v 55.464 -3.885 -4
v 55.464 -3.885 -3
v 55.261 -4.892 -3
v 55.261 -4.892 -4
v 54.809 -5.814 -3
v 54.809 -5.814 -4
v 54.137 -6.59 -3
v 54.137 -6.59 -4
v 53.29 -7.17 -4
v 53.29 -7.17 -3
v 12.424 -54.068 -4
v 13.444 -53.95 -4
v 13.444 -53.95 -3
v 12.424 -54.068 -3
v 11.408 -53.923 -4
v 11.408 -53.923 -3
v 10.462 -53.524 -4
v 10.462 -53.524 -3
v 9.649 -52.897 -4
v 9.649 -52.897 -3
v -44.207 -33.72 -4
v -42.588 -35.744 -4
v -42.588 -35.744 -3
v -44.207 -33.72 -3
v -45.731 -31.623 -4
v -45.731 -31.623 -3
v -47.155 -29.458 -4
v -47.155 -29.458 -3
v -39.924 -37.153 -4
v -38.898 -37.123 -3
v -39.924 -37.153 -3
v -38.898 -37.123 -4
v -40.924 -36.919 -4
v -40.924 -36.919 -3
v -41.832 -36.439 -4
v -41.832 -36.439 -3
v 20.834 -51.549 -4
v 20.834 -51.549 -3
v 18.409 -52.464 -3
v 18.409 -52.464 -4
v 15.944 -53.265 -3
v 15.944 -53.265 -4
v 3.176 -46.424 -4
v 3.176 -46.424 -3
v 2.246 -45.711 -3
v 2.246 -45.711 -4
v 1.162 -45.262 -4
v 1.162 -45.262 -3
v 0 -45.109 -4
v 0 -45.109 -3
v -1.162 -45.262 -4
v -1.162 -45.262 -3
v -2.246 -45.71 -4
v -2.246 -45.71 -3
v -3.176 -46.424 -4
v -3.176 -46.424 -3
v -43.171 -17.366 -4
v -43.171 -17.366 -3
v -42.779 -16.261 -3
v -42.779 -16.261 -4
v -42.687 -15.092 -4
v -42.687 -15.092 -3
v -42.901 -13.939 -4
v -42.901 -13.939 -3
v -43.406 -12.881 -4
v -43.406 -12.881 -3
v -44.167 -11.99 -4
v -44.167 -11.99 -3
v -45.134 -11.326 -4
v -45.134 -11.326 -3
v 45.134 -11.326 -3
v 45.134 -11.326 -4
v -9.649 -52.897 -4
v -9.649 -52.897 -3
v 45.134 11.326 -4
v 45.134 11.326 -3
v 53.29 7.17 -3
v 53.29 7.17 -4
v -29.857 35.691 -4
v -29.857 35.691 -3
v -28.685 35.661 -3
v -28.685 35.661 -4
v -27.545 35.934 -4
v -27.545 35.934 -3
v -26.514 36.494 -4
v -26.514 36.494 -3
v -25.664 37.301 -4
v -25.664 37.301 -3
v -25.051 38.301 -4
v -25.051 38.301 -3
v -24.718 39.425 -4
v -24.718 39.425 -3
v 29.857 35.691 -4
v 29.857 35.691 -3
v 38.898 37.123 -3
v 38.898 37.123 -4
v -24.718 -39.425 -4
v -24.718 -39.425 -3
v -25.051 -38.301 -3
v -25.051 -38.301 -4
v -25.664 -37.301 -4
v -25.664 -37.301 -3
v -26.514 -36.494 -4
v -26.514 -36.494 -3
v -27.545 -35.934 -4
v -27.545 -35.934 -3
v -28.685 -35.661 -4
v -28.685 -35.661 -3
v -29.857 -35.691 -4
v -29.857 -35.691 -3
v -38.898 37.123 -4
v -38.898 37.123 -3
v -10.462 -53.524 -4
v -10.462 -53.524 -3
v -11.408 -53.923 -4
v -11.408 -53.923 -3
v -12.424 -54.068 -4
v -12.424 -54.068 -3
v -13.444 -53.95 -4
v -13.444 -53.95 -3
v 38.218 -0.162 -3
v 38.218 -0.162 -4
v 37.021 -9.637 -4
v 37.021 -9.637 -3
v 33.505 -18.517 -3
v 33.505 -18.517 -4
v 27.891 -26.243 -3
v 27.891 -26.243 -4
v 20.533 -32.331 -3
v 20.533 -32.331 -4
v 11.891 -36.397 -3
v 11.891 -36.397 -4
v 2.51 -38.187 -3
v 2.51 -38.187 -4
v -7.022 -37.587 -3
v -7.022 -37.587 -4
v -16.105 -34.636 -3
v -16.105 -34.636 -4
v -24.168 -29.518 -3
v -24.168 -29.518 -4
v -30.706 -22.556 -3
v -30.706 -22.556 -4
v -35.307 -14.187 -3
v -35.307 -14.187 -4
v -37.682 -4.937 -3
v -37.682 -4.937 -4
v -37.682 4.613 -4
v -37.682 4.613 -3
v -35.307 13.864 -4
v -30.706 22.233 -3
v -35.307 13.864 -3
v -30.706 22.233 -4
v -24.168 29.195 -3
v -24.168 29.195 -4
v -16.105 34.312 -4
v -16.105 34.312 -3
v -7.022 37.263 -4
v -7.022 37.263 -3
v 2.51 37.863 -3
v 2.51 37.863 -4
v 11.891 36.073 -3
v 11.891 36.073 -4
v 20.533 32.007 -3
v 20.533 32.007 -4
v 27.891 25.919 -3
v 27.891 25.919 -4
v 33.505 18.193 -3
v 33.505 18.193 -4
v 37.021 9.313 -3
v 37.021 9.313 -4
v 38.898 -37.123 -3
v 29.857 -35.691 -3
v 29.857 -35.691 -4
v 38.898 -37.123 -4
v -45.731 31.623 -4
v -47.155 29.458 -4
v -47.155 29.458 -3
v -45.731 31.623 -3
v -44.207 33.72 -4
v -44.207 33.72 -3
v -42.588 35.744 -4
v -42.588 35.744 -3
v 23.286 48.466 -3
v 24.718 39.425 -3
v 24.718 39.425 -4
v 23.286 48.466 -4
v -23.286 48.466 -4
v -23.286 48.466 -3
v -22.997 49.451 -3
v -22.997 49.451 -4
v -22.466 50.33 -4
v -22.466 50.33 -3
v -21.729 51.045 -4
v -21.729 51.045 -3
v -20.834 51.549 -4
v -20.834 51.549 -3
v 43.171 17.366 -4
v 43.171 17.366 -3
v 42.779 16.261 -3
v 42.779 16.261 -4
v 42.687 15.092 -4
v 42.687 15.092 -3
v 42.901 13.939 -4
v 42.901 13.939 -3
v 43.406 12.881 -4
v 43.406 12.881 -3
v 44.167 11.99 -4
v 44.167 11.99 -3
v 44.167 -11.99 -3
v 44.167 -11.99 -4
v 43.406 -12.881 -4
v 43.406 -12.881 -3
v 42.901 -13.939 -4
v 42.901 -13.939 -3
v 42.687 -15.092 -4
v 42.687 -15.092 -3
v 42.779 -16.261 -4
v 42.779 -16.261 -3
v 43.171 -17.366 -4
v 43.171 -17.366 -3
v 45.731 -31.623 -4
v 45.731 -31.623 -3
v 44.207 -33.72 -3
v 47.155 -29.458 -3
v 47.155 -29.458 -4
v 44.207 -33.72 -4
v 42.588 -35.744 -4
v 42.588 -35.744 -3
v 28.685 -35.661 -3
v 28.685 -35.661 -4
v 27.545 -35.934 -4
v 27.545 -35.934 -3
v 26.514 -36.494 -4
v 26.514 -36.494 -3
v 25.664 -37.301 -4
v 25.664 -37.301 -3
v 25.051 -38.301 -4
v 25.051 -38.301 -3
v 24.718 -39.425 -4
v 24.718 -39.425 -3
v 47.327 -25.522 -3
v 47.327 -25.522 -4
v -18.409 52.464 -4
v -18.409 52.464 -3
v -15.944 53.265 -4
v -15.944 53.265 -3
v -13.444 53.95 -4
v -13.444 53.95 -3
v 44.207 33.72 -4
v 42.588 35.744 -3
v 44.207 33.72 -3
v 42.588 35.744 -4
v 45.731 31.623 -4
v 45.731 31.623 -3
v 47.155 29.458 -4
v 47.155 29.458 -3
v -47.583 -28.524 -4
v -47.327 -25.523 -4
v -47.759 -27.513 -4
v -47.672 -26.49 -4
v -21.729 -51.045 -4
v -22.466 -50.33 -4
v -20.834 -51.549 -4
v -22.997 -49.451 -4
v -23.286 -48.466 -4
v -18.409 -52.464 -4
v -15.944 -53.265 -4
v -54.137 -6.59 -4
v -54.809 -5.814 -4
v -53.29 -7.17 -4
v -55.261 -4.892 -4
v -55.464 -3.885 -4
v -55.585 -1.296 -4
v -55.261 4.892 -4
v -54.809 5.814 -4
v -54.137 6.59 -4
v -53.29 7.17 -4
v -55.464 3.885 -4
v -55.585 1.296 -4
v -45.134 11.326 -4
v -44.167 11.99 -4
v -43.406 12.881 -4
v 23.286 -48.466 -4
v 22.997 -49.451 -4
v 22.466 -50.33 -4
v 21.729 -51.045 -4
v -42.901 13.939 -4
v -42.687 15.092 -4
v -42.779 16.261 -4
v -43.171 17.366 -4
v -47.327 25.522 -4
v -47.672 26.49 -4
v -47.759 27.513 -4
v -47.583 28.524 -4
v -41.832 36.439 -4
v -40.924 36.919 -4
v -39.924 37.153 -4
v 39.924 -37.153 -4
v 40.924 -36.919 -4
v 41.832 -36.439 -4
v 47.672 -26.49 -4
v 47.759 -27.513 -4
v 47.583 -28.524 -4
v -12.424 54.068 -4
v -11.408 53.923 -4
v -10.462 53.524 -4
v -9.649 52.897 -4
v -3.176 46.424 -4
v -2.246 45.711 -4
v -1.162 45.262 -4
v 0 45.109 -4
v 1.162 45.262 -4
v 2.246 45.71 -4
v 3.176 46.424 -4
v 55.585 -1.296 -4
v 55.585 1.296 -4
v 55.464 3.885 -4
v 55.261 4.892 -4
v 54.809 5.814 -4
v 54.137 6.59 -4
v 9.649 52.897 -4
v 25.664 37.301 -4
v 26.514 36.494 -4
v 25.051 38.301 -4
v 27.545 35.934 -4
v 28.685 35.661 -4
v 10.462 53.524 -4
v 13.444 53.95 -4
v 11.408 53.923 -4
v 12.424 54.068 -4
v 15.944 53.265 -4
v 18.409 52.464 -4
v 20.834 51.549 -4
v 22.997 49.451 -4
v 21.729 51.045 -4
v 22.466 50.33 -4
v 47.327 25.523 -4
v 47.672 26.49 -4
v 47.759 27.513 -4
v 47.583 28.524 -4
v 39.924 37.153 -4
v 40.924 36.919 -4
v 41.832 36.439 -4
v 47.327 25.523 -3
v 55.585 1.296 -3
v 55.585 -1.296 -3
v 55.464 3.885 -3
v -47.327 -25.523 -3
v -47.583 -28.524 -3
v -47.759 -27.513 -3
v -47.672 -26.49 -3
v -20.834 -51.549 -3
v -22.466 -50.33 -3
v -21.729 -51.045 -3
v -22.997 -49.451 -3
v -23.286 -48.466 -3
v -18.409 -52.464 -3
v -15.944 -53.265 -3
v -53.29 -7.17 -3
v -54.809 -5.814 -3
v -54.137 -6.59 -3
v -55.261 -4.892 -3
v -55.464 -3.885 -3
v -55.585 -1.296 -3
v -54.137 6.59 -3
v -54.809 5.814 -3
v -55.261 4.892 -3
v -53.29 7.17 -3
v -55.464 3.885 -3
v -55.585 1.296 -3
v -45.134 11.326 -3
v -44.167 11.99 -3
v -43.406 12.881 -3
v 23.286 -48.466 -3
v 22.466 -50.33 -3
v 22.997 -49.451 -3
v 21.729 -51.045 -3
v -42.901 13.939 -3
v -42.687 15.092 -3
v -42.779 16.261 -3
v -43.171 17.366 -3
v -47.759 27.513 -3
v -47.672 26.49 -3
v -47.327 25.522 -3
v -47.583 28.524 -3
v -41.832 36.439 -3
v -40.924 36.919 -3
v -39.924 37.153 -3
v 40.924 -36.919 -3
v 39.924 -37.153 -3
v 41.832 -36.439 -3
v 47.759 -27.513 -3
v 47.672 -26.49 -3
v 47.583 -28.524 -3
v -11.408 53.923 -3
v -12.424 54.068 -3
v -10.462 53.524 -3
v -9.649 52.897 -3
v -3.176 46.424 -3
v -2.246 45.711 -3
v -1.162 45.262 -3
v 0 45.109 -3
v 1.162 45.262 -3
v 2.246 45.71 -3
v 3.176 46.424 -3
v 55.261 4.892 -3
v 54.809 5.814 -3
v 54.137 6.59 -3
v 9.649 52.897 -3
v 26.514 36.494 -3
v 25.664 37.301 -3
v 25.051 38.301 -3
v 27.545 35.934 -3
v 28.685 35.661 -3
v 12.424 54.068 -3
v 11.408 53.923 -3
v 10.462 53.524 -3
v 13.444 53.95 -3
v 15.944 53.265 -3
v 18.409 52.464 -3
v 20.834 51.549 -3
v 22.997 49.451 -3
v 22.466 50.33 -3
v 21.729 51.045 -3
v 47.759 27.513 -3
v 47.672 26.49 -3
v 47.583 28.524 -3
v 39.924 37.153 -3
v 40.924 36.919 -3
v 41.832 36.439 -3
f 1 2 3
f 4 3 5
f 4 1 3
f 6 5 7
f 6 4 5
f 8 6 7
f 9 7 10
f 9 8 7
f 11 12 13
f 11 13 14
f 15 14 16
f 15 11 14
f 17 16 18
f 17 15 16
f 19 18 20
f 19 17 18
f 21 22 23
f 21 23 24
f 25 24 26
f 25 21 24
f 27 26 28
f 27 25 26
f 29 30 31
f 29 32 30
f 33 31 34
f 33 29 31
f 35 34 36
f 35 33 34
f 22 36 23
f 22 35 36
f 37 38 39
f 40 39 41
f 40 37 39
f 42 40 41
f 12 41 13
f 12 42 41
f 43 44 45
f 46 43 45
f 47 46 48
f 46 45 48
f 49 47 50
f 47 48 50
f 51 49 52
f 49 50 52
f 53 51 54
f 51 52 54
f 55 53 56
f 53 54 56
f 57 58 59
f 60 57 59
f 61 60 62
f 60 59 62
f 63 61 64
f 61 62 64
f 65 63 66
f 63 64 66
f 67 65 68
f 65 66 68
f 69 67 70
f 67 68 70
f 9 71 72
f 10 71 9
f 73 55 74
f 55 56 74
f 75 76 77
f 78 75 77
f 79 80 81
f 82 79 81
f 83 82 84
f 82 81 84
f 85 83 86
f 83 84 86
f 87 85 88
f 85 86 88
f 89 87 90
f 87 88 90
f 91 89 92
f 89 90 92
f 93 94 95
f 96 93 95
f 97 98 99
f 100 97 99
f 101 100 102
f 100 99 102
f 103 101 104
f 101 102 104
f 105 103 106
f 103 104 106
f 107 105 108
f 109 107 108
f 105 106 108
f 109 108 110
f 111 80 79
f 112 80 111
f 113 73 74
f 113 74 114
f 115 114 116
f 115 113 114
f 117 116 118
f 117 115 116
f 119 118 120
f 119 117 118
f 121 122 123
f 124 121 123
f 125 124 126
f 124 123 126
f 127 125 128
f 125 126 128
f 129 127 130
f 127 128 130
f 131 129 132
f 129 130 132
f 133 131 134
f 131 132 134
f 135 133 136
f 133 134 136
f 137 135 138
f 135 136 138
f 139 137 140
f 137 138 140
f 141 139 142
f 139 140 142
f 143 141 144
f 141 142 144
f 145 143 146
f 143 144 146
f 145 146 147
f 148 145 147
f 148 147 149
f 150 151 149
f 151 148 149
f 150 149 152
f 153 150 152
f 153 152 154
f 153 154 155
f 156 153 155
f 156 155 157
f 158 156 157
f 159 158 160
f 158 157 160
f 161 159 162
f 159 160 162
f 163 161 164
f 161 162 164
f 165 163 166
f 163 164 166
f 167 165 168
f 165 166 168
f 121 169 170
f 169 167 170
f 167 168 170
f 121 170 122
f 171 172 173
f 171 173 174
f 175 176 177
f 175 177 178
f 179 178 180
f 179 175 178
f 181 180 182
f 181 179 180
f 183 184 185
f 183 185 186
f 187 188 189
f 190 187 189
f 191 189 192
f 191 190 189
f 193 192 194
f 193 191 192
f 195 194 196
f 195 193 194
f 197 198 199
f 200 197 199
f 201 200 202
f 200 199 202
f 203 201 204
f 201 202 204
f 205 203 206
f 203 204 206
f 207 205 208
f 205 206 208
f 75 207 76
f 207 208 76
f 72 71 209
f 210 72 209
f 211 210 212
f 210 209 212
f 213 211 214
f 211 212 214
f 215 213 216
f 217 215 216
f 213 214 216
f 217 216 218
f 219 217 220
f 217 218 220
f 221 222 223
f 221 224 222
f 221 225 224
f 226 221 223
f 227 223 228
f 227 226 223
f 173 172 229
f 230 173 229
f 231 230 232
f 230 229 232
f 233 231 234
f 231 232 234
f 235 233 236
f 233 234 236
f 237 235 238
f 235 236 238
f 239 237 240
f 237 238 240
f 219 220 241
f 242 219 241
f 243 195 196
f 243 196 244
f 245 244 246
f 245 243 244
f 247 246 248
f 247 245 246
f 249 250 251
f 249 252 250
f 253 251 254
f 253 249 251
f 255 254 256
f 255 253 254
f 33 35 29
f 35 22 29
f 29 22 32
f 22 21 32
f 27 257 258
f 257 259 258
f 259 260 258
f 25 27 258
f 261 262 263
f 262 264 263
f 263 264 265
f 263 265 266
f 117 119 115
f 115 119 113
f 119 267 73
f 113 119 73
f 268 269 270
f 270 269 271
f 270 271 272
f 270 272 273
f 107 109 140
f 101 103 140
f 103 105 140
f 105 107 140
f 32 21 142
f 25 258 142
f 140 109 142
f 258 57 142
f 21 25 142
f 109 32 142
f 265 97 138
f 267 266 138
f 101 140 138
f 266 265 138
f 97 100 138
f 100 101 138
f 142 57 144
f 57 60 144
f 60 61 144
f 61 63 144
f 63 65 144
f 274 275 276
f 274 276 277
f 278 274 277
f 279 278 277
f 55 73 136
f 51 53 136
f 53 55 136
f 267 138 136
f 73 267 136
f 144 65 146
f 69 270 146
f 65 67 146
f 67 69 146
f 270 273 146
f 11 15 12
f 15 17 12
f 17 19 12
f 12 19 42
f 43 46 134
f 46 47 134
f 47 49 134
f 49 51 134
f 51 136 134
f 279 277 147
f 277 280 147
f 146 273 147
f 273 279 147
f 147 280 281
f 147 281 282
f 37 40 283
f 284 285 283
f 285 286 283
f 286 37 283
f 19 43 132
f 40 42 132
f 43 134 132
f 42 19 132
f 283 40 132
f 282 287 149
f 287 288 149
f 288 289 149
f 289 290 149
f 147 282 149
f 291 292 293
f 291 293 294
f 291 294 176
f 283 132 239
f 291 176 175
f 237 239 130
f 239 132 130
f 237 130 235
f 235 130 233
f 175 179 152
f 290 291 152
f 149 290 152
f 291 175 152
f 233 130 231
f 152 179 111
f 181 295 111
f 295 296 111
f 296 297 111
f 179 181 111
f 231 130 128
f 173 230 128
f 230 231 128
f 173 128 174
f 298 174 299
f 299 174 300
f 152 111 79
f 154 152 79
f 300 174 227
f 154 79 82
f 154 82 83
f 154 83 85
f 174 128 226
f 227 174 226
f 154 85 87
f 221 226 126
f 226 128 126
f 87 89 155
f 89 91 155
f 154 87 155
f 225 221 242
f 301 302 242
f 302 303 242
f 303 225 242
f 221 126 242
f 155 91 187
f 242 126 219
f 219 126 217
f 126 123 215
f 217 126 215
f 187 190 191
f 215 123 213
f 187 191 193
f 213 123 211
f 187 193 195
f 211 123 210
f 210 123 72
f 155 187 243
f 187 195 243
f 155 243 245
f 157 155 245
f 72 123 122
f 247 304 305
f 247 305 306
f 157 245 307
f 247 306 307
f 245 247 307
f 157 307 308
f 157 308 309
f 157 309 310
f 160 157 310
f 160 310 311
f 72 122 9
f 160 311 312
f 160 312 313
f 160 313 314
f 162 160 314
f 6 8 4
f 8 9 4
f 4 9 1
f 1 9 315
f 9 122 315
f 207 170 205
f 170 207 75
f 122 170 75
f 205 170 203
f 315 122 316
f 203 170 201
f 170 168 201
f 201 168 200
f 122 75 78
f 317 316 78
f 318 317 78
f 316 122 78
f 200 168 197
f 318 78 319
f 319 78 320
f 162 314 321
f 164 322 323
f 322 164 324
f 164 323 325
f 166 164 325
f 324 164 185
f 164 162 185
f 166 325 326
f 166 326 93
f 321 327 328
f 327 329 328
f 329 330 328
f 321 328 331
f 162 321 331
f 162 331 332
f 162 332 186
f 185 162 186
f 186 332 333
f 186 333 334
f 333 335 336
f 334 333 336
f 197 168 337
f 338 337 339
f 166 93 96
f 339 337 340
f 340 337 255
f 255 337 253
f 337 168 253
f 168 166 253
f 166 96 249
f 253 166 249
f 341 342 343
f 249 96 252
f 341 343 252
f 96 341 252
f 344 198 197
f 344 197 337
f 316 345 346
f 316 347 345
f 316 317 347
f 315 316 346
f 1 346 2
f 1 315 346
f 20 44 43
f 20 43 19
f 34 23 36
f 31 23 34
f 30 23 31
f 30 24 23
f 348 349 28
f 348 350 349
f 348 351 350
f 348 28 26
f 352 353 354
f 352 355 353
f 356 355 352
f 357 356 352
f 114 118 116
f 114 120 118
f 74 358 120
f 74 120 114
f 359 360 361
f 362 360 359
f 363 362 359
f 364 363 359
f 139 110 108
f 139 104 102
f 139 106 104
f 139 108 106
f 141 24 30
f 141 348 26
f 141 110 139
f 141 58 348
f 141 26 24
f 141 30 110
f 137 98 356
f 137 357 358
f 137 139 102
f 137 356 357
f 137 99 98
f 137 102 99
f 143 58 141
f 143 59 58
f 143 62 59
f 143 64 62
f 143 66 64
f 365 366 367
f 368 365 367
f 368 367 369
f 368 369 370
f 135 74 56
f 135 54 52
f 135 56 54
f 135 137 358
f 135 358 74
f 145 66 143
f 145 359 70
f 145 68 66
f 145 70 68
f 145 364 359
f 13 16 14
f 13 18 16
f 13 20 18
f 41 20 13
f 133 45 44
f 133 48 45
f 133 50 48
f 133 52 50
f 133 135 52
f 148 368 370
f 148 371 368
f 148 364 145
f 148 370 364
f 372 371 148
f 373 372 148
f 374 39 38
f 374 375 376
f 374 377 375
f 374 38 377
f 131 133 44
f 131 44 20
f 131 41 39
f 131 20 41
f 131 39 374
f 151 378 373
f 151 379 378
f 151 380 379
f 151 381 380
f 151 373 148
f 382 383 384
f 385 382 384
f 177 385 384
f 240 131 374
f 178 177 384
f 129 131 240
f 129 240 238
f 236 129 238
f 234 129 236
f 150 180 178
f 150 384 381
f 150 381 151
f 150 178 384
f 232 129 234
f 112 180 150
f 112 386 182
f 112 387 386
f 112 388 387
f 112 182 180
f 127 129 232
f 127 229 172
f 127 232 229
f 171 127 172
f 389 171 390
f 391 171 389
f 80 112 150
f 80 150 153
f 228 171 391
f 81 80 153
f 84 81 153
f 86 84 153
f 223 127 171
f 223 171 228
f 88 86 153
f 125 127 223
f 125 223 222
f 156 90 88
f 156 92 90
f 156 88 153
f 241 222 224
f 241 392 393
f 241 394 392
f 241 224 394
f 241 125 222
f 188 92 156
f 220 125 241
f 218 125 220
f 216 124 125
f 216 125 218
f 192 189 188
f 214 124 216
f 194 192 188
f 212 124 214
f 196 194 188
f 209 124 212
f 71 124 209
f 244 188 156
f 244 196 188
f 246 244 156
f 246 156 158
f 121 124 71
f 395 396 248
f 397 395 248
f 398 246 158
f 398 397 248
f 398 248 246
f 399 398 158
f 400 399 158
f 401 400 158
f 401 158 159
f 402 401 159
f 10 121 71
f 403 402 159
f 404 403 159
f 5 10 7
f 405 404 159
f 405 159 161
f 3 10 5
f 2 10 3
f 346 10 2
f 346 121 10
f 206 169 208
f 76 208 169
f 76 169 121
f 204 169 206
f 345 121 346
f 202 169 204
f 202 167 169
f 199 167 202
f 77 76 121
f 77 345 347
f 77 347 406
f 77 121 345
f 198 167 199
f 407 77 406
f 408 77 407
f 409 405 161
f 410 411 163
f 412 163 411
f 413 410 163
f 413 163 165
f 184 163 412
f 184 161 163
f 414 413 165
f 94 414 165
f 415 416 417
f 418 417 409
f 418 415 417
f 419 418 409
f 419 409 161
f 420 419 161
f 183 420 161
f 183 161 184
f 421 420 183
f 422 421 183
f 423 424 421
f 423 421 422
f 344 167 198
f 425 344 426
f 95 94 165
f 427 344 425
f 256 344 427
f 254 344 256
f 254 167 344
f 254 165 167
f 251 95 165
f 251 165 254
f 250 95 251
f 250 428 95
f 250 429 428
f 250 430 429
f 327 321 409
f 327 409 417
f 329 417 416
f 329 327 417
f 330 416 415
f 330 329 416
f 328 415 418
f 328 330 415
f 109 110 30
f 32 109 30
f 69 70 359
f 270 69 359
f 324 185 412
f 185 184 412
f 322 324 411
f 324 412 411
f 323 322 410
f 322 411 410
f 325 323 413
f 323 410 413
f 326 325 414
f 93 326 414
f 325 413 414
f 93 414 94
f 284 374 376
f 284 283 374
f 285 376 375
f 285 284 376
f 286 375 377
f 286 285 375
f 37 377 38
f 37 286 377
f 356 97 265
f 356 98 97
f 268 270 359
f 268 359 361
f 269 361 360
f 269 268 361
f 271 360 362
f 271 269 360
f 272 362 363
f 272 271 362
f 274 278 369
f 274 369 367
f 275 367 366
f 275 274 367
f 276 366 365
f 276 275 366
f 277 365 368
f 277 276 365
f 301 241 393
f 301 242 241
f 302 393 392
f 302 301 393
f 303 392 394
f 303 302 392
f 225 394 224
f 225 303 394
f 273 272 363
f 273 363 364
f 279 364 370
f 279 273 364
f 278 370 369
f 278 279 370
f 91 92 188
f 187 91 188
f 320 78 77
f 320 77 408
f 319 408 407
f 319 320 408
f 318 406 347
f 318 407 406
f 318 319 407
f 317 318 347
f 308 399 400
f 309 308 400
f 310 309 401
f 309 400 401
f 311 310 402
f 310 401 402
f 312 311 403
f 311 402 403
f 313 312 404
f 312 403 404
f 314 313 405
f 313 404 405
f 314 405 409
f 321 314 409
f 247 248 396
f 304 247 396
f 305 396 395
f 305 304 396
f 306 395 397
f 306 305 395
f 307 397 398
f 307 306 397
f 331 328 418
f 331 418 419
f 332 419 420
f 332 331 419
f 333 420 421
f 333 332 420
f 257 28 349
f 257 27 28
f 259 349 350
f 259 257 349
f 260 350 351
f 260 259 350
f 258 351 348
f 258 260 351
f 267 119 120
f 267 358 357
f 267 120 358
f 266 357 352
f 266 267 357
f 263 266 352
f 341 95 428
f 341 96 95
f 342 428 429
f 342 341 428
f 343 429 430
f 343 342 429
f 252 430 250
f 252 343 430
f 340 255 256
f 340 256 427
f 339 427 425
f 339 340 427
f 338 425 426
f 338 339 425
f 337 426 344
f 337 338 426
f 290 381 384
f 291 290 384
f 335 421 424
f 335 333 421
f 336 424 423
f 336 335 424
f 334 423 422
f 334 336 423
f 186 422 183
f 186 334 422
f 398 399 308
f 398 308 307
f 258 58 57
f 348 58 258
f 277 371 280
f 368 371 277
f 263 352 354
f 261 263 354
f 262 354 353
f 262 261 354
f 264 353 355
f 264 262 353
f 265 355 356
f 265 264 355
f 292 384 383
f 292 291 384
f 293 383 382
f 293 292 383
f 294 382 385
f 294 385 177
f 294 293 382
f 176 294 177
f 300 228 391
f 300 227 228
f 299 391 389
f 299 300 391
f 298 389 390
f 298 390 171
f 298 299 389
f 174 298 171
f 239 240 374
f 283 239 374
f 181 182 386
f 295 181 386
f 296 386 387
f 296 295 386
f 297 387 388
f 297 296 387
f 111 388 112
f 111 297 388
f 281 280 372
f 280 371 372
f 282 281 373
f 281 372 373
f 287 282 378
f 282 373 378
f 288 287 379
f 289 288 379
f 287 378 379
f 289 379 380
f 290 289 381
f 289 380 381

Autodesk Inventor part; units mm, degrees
ref_plane "YZ Plane" through (0, 0, 0) normal (1, 0, 0) x (0, 1, 0)
ref_plane "XZ Plane" through (0, 0, 0) normal (0, 1, 0) x (-1, 0, 0)
ref_plane "XY Plane" through (0, 0, 0) normal (0, 0, 1) x (1, 0, 0)
ref_plane "Work Plane1" through (0, 0, -4) normal (0, 0, 1) x (1, 0, 0)
sketch "Sketch1" plane through (0, 0, -4) normal (0, 0, 1) x (1, 0, 0)
  circle A0 centre (0.1176, -0.1618) radius 38.1 projected
  circle A1 centre (0, 0) radius 43.6 projected
  circle A2 centre (0, 0) radius 55.6 projected
  point P0 (0, 0)
extrude "Extrusion1" add sketch "Sketch1" along normal blind 1 contours A1 | A2
sketch "Sketch2" plane through (0, 0, -3) normal (0, 0, 1) x (1, 0, 0)
  circle A0 centre (47.1724, 15.3272) radius 2 projected
  circle A1 centre (47.1724, 15.3272) radius 4.4912
  line L0 (45.1335, 11.3256) -> (55.2569, 6.1675)
  circle A2 centre (0, 0) radius 55.6 projected
  line L1 (43.1708, 17.3662) -> (48.3289, 27.4896)
  line L2 (47.1724, 15.3272) -> (52.8787, 17.1813)
  point P0 (0, 0)
  dimension "d2" = 45
  dimension "d3" = 45
extrude "Extrusion2" cut sketch "Sketch2" against normal blind 1 contours A0 | A1 | A1 L1 A2 L2 | L2 A2 L0 A1
fillet "Fillet1" radius 4 2 edges at (48.3289, 27.4896, -3.5) (55.2569, 6.1675, -3.5)
pattern_circular "Circular Pattern1" count 10 over 360 about axis through (0, 0, -4) along (0, 0, 1) of "Extrusion2", "Fillet1"
sketch "Sketch3" plane through (0, 0, -3) normal (0, 0, 1) x (1, 0, 0)
  arc A0 (47.1551, -29.4578) -> (47.3266, -25.5226) centre (43.7626, -27.3385) ccw projected
  line L0 (47.3266, -25.5226) -> (43.1708, -17.3662) projected
  arc A1 (45.1335, -11.3256) -> (43.1708, -17.3662) centre (47.1724, -15.3272) ccw projected
  line L1 (45.1335, -11.3256) -> (53.2898, -7.1697) projected
  arc A2 (53.2898, -7.1697) -> (55.4641, -3.8852) centre (51.4739, -3.6057) ccw projected
  arc A3 (55.4641, -3.8852) -> (55.4641, 3.8852) centre (0, 0) ccw projected
  arc A4 (55.4641, 3.8852) -> (53.2898, 7.1697) centre (51.4739, 3.6057) ccw projected
  line L2 (53.2898, 7.1697) -> (45.1335, 11.3256) projected
  arc A5 (43.1708, 17.3662) -> (45.1335, 11.3256) centre (47.1724, 15.3272) ccw projected
  line L3 (43.1708, 17.3662) -> (47.3266, 25.5226) projected
  arc A6 (47.3266, 25.5226) -> (47.1551, 29.4578) centre (43.7626, 27.3385) ccw projected
  arc A7 (47.1551, 29.4578) -> (42.5877, 35.7442) centre (0, 0) ccw projected
  arc A8 (42.5877, 35.7442) -> (38.8981, 37.1234) centre (39.5239, 33.1726) ccw projected
  line L4 (38.8981, 37.1234) -> (29.8567, 35.6914) projected
  arc A9 (24.7183, 39.4247) -> (29.8567, 35.6914) centre (29.1541, 40.1272) ccw projected
  line L5 (24.7183, 39.4247) -> (23.2863, 48.4661) projected
  arc A10 (23.2863, 48.4661) -> (20.8344, 51.5489) centre (19.3355, 47.8403) ccw projected
  arc A11 (20.8344, 51.5489) -> (13.4443, 53.9501) centre (0, 0) ccw projected
  arc A12 (13.4443, 53.9501) -> (9.6487, 52.8972) centre (12.4771, 50.0688) ccw projected
  line L6 (9.6487, 52.8972) -> (3.1757, 46.4243) projected
  arc A13 (-3.1757, 46.4243) -> (3.1757, 46.4243) centre (0, 49.6) ccw projected
  line L7 (-3.1757, 46.4243) -> (-9.6487, 52.8972) projected
  arc A14 (-9.6487, 52.8972) -> (-13.4443, 53.9501) centre (-12.4771, 50.0688) ccw projected
  arc A15 (-13.4443, 53.9501) -> (-20.8344, 51.5489) centre (0, 0) ccw projected
  arc A16 (-20.8344, 51.5489) -> (-23.2863, 48.4661) centre (-19.3355, 47.8403) ccw projected
  line L8 (-23.2863, 48.4661) -> (-24.7183, 39.4247) projected
  arc A17 (-29.8567, 35.6914) -> (-24.7183, 39.4247) centre (-29.1541, 40.1272) ccw projected
  line L9 (-29.8567, 35.6914) -> (-38.8981, 37.1234) projected
  arc A18 (-38.8981, 37.1234) -> (-42.5877, 35.7442) centre (-39.5239, 33.1726) ccw projected
  arc A19 (-42.5877, 35.7442) -> (-47.1551, 29.4578) centre (0, 0) ccw projected
  arc A20 (-47.1551, 29.4578) -> (-47.3266, 25.5226) centre (-43.7626, 27.3385) ccw projected
  line L10 (-47.3266, 25.5226) -> (-43.1708, 17.3662) projected
  arc A21 (-45.1335, 11.3256) -> (-43.1708, 17.3662) centre (-47.1724, 15.3272) ccw projected
  line L11 (-45.1335, 11.3256) -> (-53.2898, 7.1697) projected
  arc A22 (-53.2898, 7.1697) -> (-55.4641, 3.8852) centre (-51.4739, 3.6057) ccw projected
  arc A23 (-55.4641, 3.8852) -> (-55.4641, -3.8852) centre (0, 0) ccw projected
  arc A24 (-55.4641, -3.8852) -> (-53.2898, -7.1697) centre (-51.4739, -3.6057) ccw projected
  line L12 (-53.2898, -7.1697) -> (-45.1335, -11.3256) projected
  arc A25 (-43.1708, -17.3662) -> (-45.1335, -11.3256) centre (-47.1724, -15.3272) ccw projected
  line L13 (-43.1708, -17.3662) -> (-47.3266, -25.5226) projected
  arc A26 (-47.3266, -25.5226) -> (-47.1551, -29.4578) centre (-43.7626, -27.3385) ccw projected
  arc A27 (-47.1551, -29.4578) -> (-42.5877, -35.7442) centre (0, 0) ccw projected
  arc A28 (-42.5877, -35.7442) -> (-38.8981, -37.1234) centre (-39.5239, -33.1726) ccw projected
  line L14 (-38.8981, -37.1234) -> (-29.8567, -35.6914) projected
  arc A29 (-24.7183, -39.4247) -> (-29.8567, -35.6914) centre (-29.1541, -40.1272) ccw projected
  line L15 (-24.7183, -39.4247) -> (-23.2863, -48.4661) projected
  arc A30 (-23.2863, -48.4661) -> (-20.8344, -51.5489) centre (-19.3355, -47.8403) ccw projected
  arc A31 (-20.8344, -51.5489) -> (-13.4443, -53.9501) centre (0, 0) ccw projected
  arc A32 (-13.4443, -53.9501) -> (-9.6487, -52.8972) centre (-12.4771, -50.0688) ccw projected
  line L16 (-9.6487, -52.8972) -> (-3.1757, -46.4243) projected
  arc A33 (3.1757, -46.4243) -> (-3.1757, -46.4243) centre (0, -49.6) ccw projected
  line L17 (3.1757, -46.4243) -> (9.6487, -52.8972) projected
  arc A34 (9.6487, -52.8972) -> (13.4443, -53.9501) centre (12.4771, -50.0688) ccw projected
  arc A35 (13.4443, -53.9501) -> (20.8344, -51.5489) centre (0, 0) ccw projected
  arc A36 (20.8344, -51.5489) -> (23.2863, -48.4661) centre (19.3355, -47.8403) ccw projected
  line L18 (23.2863, -48.4661) -> (24.7183, -39.4247) projected
  arc A37 (29.8567, -35.6914) -> (24.7183, -39.4247) centre (29.1541, -40.1272) ccw projected
  line L19 (29.8567, -35.6914) -> (38.8981, -37.1234) projected
  arc A38 (38.8981, -37.1234) -> (42.5877, -35.7442) centre (39.5239, -33.1726) ccw projected
  arc A39 (42.5877, -35.7442) -> (47.1551, -29.4578) centre (0, 0) ccw projected
  circle A40 centre (0.1176, -0.1618) radius 38.1 projected
  point P0 (0, 0)
equation "\"d3\" = d2"
properties part number "Anglerfish_3inch_tube_rubberring"
